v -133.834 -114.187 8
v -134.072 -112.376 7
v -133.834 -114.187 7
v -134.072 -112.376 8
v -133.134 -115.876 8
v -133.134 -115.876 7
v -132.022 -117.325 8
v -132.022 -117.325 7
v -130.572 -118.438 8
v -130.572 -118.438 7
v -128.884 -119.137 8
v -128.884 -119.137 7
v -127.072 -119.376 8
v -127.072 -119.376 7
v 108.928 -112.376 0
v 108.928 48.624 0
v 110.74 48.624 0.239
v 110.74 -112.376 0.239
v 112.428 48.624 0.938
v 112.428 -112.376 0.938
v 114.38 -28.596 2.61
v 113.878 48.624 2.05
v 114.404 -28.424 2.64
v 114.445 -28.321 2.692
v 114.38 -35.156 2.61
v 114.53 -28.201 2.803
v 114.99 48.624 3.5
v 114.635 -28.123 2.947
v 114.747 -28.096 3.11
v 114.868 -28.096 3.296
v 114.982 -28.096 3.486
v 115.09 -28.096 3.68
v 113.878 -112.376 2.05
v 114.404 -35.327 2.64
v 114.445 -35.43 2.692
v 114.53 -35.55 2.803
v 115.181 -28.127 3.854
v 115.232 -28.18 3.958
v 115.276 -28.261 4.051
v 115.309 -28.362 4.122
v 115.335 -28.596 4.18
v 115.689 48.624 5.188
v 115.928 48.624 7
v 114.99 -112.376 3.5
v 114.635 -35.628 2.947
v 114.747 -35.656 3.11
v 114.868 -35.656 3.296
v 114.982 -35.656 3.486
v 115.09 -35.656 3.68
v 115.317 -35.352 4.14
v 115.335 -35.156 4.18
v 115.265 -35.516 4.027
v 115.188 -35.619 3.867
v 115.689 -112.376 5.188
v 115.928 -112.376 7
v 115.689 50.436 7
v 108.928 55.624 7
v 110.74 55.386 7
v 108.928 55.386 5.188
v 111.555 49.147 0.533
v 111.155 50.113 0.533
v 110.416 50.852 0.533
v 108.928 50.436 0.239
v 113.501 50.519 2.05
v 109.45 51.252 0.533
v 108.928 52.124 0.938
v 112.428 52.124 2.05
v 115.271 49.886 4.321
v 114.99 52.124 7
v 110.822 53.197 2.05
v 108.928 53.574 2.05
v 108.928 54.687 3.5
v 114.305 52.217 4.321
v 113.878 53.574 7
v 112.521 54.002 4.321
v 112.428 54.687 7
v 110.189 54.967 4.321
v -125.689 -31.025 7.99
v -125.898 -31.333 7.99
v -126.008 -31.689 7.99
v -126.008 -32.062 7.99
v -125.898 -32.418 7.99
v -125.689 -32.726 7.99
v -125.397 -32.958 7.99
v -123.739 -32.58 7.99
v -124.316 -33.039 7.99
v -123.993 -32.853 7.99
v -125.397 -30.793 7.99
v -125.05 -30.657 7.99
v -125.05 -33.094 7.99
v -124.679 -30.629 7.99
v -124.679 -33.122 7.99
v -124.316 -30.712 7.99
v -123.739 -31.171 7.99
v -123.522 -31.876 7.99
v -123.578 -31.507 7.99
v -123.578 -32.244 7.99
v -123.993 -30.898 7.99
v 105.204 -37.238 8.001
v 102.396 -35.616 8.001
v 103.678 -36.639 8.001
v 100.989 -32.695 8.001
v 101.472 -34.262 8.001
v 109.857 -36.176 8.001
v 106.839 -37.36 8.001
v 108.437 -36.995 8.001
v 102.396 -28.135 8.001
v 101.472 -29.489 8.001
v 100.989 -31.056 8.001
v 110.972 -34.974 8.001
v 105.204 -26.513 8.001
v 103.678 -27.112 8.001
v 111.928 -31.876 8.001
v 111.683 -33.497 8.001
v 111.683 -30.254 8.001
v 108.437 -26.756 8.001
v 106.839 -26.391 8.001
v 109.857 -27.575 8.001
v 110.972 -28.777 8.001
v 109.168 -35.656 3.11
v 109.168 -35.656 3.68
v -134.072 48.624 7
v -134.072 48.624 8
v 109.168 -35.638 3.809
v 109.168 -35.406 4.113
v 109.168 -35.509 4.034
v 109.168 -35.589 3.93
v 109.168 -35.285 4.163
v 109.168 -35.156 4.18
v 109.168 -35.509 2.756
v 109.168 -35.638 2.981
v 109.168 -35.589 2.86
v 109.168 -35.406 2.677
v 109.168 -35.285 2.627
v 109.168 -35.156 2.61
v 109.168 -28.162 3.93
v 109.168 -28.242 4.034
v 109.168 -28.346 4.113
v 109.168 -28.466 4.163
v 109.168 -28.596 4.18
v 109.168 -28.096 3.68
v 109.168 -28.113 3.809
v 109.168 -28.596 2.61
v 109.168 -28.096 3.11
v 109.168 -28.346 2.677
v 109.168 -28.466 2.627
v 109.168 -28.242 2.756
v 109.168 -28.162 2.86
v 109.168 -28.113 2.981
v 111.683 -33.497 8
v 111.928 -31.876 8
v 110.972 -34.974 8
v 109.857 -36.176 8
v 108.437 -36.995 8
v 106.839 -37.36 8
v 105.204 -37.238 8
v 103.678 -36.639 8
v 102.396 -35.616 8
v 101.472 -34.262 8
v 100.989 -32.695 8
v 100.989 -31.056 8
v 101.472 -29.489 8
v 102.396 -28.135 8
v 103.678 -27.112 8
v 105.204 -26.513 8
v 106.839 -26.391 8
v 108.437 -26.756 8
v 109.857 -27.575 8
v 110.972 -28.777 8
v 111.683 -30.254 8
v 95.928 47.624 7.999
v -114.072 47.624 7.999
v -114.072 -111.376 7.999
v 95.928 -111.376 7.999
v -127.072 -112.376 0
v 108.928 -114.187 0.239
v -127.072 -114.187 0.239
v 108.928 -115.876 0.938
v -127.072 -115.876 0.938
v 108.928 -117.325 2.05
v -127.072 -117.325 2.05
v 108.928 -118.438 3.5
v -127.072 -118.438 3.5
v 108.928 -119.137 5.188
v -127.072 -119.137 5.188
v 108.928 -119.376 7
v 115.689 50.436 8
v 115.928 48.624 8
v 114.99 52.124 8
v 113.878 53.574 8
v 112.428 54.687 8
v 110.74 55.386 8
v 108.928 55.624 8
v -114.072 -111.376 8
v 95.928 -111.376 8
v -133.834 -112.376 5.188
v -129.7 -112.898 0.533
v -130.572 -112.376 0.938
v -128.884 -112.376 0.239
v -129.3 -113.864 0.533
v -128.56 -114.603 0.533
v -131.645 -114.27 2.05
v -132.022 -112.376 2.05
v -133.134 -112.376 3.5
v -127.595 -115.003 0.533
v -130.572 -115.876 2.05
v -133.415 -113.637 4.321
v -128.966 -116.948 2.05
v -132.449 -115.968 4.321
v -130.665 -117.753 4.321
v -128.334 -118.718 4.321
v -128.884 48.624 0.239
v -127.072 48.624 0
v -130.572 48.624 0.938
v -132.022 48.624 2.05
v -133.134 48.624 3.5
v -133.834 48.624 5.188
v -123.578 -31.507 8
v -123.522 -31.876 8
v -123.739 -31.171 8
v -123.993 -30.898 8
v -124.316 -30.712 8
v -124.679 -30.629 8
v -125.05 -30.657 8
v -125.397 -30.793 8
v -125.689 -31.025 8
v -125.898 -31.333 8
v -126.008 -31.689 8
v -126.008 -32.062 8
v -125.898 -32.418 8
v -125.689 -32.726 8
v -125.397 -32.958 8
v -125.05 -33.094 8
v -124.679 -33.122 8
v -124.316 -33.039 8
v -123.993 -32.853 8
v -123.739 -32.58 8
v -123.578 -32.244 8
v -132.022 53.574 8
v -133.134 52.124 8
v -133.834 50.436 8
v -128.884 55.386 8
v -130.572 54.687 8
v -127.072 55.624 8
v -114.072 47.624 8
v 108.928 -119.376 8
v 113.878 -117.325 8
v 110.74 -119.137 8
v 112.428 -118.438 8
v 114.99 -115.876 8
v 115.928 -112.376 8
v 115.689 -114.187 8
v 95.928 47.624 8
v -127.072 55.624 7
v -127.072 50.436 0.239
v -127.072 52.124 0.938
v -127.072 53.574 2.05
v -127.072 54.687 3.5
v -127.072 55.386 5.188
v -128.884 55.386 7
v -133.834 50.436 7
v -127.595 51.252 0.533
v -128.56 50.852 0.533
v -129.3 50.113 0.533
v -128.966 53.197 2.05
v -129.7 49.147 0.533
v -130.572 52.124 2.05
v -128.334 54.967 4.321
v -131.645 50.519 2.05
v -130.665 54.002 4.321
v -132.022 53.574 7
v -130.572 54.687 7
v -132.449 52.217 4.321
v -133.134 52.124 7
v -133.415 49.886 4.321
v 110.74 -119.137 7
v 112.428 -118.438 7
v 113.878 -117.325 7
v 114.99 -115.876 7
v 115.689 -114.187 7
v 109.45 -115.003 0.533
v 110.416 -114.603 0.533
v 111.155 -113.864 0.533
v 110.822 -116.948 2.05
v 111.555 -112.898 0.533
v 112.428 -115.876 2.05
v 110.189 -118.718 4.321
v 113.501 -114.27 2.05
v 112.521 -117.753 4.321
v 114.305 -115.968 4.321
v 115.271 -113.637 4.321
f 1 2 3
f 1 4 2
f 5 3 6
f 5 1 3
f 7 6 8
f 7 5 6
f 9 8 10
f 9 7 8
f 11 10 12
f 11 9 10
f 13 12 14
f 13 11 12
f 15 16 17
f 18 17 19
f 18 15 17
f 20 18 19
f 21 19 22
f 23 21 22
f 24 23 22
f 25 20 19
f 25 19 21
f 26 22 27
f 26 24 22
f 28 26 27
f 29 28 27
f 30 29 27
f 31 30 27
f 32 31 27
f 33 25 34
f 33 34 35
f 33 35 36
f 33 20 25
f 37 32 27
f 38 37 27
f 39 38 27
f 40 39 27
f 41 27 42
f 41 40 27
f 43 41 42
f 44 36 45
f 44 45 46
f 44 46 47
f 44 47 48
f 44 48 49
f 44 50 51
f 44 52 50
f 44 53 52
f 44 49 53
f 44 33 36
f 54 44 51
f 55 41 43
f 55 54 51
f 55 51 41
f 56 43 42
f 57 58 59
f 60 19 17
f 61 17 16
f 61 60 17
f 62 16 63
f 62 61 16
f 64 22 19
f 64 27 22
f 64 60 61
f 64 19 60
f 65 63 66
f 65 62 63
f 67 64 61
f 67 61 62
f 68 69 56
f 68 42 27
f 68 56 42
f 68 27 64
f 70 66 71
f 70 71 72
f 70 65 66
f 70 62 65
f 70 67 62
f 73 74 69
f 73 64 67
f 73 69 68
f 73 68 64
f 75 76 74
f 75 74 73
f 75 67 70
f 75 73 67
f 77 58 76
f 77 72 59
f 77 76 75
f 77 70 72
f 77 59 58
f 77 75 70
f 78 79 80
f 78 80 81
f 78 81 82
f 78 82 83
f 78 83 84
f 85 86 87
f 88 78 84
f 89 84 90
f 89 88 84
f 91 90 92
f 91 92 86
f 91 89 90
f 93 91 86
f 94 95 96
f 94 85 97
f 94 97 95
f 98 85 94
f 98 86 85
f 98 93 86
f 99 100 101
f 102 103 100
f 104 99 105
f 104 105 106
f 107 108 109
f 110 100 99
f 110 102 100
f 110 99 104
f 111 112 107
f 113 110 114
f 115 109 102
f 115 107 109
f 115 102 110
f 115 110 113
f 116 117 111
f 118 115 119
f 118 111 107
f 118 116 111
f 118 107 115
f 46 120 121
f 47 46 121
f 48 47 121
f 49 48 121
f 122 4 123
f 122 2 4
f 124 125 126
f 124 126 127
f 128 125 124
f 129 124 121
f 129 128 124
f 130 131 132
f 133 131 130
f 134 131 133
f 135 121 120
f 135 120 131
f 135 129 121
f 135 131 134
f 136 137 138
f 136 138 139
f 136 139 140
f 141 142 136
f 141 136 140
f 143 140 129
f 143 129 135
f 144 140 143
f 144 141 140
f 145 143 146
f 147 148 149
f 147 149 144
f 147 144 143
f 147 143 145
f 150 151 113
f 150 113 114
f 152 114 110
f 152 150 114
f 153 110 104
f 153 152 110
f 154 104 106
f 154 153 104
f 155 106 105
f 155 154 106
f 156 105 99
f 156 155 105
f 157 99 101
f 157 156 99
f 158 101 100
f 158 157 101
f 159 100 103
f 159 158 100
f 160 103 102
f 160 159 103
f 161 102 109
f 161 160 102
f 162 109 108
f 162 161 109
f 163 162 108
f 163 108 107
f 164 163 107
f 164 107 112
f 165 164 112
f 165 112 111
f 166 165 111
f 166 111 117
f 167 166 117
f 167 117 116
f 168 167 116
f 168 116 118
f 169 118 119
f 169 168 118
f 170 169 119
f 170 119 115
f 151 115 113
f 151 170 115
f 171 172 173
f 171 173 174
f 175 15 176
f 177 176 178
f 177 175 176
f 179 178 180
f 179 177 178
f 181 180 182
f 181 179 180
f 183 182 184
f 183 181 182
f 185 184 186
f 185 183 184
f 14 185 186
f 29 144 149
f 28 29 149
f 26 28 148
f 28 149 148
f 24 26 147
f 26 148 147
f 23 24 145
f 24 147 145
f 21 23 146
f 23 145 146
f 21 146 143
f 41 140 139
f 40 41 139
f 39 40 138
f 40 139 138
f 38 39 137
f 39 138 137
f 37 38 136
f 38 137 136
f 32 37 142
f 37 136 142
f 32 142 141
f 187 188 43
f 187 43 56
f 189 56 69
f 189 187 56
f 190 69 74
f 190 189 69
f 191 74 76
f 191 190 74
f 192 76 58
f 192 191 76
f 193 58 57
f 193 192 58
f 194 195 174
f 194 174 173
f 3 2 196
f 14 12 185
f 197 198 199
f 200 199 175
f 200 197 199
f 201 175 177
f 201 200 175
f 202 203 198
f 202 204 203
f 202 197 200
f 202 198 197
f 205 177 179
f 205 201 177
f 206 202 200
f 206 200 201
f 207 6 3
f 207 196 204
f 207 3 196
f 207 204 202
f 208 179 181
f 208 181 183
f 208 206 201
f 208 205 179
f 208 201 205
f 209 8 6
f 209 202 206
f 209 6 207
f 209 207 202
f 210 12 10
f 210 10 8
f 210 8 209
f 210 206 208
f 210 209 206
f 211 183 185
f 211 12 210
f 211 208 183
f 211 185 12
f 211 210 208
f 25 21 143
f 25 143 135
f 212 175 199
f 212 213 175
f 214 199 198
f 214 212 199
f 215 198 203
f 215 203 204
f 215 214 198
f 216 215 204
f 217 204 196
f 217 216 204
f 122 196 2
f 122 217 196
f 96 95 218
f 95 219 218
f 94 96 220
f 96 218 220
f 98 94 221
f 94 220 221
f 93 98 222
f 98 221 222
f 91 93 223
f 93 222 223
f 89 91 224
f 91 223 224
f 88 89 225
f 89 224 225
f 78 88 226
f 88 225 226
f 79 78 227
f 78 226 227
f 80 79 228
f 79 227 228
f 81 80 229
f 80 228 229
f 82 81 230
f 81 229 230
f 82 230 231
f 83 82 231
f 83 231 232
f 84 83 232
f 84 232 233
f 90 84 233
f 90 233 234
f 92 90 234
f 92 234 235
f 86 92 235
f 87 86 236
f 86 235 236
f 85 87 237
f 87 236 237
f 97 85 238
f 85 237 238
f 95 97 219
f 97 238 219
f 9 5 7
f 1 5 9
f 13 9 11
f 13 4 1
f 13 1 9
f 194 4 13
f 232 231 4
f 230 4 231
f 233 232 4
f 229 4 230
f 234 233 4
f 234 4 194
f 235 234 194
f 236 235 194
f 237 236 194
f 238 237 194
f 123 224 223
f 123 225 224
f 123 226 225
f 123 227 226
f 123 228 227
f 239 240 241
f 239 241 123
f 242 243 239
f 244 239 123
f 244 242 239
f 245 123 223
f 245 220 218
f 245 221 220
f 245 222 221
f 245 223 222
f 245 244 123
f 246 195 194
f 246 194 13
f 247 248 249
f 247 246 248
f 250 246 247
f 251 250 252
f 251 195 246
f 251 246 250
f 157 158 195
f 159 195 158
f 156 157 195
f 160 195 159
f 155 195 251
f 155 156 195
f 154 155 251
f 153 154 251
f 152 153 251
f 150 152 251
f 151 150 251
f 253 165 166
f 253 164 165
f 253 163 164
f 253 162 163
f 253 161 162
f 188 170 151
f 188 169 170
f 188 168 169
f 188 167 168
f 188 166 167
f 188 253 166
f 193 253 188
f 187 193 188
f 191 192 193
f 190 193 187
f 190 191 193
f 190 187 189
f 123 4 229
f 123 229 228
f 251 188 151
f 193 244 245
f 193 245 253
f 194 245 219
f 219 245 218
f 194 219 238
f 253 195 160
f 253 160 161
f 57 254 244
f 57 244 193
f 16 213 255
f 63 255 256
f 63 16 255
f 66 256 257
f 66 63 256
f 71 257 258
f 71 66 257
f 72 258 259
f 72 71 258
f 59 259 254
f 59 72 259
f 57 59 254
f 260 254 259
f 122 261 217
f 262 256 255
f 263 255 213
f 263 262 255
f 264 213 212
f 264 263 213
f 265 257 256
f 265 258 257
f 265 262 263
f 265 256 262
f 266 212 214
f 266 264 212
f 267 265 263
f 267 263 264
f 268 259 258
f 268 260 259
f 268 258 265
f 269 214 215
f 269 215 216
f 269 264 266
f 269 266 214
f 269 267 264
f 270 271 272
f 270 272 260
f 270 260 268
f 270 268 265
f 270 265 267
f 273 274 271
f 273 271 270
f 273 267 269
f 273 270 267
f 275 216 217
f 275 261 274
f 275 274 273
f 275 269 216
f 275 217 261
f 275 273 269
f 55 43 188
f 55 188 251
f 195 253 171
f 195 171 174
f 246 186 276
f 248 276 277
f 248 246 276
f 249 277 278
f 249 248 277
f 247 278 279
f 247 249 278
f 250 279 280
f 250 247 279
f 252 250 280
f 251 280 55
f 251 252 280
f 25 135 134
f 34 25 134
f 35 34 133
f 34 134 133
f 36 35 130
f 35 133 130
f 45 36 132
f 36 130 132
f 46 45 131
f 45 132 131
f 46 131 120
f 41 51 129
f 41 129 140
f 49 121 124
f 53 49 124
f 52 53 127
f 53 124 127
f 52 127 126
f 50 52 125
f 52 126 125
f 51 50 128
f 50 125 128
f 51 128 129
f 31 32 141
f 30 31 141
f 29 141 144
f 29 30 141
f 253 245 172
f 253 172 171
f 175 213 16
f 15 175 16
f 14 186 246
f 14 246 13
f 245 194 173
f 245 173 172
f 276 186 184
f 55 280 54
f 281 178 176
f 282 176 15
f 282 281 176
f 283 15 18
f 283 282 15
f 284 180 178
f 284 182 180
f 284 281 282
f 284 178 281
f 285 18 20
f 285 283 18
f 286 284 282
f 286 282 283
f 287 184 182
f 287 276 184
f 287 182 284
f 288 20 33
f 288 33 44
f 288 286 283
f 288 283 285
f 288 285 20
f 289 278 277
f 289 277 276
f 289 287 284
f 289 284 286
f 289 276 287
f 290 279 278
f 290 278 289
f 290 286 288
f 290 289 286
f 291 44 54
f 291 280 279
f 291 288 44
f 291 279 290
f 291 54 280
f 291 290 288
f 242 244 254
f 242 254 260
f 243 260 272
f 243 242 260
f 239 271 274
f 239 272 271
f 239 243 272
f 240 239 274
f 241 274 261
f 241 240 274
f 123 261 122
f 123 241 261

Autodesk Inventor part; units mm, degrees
ref_plane "YZ Plane" through (0, 0, 0) normal (1, 0, 0) x (0, 1, 0)
ref_plane "XZ Plane" through (0, 0, 0) normal (0, 1, 0) x (-1, 0, 0)
ref_plane "XY Plane" through (0, 0, 0) normal (0, 0, 1) x (1, 0, 0)
sketch "スケッチ1" plane through (0, 0, 0) normal (0, 0, 1) x (1, 0, 0)
  line L0 (-134.0722, 55.6245) -> (115.9278, 55.6245)
  line L1 (115.9278, 55.6245) -> (115.9278, -119.3755)
  line L2 (115.9278, -119.3755) -> (-134.0722, -119.3755)
  line L3 (-134.0722, -119.3755) -> (-134.0722, 55.6245)
  point P0 (0, 0)
  dimension "d0" = 250
  dimension "d1" = 175
extrude "押し出し1" add sketch "スケッチ1" along normal blind 8
fillet "フィレット1" radius 7 4 edges at (115.9278, 55.6245, 4) (-134.0722, 55.6245, 4) (-134.0722, -119.3755, 4) (115.9278, -119.3755, 4)
fillet "フィレット2" radius 7 8 edges at (-134.0722, -31.8755, 0) (-132.0219, -117.3252, 0) (-9.0722, -119.3755, 0) (113.8775, -117.3252, 0) (115.9278, -31.8755, 0) (113.8775, 53.5743, 0) (-9.0722, 55.6245, 0) (-132.0219, 53.5743, 0)
sketch "スケッチ2" plane through (0, 0, 8) normal (0, 0, 1) x (1, 0, 0)
  line L0 (-114.0722, 47.6245) -> (95.9278, 47.6245)
  line L1 (95.9278, 47.6245) -> (95.9278, -111.3755)
  line L2 (95.9278, -111.3755) -> (-114.0722, -111.3755)
  line L3 (-114.0722, -111.3755) -> (-114.0722, 47.6245)
  line L4 (-134.0722, 48.6245) -> (-134.0722, -112.3755) projected
  line L5 (115.9278, -112.3755) -> (115.9278, 48.6245) projected
  line L6 (108.9278, 55.6245) -> (-127.0722, 55.6245) projected
  line L7 (-127.0722, -119.3755) -> (108.9278, -119.3755) projected
  dimension "d6" = 20
  dimension "d7" = 20
  dimension "d8" = 8
  dimension "d9" = 8
extrude "押し出し2" cut sketch "スケッチ2" against normal blind 0.001
sketch "スケッチ3" plane through (0, 0, 8) normal (0, 0, 1) x (1, 0, 0)
  line L0 (-127.0722, -119.3755) -> (108.9278, -119.3755) projected
  line L1 (108.9278, 55.6245) -> (-127.0722, 55.6245) projected
  circle A0 centre (106.4278, -31.8755) radius 5.5
  line L2 (115.9278, -112.3755) -> (115.9278, 48.6245) projected
  point P0 (0, 0)
  dimension "d12" = 11
  dimension "d13" = 87.5
  dimension "d14" = 9.5
extrude "押し出し3" add sketch "スケッチ3" along normal blind 0.001
sketch "スケッチ4" plane through (115.9278, -112.3755, 8) normal (1, 0, 0) x (0, 0, -1)
  line L0 (8, 0) -> (8, 161) projected
  line L1 (0, 0) -> (0, 161) projected
  line L2 (5.39, 76.72) -> (3.82, 76.72)
  line L3 (3.82, 76.72) -> (3.82, 84.28)
  line L4 (3.82, 84.28) -> (5.39, 84.28)
  line L5 (5.39, 84.28) -> (5.39, 76.72)
  point P0 (8, 112.3755)
  dimension "d17" = 1.57
  dimension "d18" = 7.56
  dimension "d19" = 3.82
  dimension "d20" = 76.72
extrude "押し出し4" cut sketch "スケッチ4" against normal blind 6.76
fillet "フィレット3" radius 0.5 4 edges at (112.2512, -28.0955, 4.18) (111.774, -28.0955, 2.61) (112.2512, -35.6555, 4.18) (111.774, -35.6555, 2.61)
sketch "スケッチ5" plane through (0, 0, 8) normal (0, 0, 1) x (1, 0, 0)
  circle A0 centre (-124.7722, -31.8755) radius 1.25
  line L0 (-134.0722, 48.6245) -> (-134.0722, -112.3755) projected
  line L1 (108.9278, 55.6245) -> (-127.0722, 55.6245) projected
  point P0 (0, 0)
  dimension "d24" = 2.5
  dimension "d25" = 9.3
  dimension "d26" = 87.5
extrude "押し出し5" cut sketch "スケッチ5" against normal blind 0.01
properties part number "iPadModelA2197"
